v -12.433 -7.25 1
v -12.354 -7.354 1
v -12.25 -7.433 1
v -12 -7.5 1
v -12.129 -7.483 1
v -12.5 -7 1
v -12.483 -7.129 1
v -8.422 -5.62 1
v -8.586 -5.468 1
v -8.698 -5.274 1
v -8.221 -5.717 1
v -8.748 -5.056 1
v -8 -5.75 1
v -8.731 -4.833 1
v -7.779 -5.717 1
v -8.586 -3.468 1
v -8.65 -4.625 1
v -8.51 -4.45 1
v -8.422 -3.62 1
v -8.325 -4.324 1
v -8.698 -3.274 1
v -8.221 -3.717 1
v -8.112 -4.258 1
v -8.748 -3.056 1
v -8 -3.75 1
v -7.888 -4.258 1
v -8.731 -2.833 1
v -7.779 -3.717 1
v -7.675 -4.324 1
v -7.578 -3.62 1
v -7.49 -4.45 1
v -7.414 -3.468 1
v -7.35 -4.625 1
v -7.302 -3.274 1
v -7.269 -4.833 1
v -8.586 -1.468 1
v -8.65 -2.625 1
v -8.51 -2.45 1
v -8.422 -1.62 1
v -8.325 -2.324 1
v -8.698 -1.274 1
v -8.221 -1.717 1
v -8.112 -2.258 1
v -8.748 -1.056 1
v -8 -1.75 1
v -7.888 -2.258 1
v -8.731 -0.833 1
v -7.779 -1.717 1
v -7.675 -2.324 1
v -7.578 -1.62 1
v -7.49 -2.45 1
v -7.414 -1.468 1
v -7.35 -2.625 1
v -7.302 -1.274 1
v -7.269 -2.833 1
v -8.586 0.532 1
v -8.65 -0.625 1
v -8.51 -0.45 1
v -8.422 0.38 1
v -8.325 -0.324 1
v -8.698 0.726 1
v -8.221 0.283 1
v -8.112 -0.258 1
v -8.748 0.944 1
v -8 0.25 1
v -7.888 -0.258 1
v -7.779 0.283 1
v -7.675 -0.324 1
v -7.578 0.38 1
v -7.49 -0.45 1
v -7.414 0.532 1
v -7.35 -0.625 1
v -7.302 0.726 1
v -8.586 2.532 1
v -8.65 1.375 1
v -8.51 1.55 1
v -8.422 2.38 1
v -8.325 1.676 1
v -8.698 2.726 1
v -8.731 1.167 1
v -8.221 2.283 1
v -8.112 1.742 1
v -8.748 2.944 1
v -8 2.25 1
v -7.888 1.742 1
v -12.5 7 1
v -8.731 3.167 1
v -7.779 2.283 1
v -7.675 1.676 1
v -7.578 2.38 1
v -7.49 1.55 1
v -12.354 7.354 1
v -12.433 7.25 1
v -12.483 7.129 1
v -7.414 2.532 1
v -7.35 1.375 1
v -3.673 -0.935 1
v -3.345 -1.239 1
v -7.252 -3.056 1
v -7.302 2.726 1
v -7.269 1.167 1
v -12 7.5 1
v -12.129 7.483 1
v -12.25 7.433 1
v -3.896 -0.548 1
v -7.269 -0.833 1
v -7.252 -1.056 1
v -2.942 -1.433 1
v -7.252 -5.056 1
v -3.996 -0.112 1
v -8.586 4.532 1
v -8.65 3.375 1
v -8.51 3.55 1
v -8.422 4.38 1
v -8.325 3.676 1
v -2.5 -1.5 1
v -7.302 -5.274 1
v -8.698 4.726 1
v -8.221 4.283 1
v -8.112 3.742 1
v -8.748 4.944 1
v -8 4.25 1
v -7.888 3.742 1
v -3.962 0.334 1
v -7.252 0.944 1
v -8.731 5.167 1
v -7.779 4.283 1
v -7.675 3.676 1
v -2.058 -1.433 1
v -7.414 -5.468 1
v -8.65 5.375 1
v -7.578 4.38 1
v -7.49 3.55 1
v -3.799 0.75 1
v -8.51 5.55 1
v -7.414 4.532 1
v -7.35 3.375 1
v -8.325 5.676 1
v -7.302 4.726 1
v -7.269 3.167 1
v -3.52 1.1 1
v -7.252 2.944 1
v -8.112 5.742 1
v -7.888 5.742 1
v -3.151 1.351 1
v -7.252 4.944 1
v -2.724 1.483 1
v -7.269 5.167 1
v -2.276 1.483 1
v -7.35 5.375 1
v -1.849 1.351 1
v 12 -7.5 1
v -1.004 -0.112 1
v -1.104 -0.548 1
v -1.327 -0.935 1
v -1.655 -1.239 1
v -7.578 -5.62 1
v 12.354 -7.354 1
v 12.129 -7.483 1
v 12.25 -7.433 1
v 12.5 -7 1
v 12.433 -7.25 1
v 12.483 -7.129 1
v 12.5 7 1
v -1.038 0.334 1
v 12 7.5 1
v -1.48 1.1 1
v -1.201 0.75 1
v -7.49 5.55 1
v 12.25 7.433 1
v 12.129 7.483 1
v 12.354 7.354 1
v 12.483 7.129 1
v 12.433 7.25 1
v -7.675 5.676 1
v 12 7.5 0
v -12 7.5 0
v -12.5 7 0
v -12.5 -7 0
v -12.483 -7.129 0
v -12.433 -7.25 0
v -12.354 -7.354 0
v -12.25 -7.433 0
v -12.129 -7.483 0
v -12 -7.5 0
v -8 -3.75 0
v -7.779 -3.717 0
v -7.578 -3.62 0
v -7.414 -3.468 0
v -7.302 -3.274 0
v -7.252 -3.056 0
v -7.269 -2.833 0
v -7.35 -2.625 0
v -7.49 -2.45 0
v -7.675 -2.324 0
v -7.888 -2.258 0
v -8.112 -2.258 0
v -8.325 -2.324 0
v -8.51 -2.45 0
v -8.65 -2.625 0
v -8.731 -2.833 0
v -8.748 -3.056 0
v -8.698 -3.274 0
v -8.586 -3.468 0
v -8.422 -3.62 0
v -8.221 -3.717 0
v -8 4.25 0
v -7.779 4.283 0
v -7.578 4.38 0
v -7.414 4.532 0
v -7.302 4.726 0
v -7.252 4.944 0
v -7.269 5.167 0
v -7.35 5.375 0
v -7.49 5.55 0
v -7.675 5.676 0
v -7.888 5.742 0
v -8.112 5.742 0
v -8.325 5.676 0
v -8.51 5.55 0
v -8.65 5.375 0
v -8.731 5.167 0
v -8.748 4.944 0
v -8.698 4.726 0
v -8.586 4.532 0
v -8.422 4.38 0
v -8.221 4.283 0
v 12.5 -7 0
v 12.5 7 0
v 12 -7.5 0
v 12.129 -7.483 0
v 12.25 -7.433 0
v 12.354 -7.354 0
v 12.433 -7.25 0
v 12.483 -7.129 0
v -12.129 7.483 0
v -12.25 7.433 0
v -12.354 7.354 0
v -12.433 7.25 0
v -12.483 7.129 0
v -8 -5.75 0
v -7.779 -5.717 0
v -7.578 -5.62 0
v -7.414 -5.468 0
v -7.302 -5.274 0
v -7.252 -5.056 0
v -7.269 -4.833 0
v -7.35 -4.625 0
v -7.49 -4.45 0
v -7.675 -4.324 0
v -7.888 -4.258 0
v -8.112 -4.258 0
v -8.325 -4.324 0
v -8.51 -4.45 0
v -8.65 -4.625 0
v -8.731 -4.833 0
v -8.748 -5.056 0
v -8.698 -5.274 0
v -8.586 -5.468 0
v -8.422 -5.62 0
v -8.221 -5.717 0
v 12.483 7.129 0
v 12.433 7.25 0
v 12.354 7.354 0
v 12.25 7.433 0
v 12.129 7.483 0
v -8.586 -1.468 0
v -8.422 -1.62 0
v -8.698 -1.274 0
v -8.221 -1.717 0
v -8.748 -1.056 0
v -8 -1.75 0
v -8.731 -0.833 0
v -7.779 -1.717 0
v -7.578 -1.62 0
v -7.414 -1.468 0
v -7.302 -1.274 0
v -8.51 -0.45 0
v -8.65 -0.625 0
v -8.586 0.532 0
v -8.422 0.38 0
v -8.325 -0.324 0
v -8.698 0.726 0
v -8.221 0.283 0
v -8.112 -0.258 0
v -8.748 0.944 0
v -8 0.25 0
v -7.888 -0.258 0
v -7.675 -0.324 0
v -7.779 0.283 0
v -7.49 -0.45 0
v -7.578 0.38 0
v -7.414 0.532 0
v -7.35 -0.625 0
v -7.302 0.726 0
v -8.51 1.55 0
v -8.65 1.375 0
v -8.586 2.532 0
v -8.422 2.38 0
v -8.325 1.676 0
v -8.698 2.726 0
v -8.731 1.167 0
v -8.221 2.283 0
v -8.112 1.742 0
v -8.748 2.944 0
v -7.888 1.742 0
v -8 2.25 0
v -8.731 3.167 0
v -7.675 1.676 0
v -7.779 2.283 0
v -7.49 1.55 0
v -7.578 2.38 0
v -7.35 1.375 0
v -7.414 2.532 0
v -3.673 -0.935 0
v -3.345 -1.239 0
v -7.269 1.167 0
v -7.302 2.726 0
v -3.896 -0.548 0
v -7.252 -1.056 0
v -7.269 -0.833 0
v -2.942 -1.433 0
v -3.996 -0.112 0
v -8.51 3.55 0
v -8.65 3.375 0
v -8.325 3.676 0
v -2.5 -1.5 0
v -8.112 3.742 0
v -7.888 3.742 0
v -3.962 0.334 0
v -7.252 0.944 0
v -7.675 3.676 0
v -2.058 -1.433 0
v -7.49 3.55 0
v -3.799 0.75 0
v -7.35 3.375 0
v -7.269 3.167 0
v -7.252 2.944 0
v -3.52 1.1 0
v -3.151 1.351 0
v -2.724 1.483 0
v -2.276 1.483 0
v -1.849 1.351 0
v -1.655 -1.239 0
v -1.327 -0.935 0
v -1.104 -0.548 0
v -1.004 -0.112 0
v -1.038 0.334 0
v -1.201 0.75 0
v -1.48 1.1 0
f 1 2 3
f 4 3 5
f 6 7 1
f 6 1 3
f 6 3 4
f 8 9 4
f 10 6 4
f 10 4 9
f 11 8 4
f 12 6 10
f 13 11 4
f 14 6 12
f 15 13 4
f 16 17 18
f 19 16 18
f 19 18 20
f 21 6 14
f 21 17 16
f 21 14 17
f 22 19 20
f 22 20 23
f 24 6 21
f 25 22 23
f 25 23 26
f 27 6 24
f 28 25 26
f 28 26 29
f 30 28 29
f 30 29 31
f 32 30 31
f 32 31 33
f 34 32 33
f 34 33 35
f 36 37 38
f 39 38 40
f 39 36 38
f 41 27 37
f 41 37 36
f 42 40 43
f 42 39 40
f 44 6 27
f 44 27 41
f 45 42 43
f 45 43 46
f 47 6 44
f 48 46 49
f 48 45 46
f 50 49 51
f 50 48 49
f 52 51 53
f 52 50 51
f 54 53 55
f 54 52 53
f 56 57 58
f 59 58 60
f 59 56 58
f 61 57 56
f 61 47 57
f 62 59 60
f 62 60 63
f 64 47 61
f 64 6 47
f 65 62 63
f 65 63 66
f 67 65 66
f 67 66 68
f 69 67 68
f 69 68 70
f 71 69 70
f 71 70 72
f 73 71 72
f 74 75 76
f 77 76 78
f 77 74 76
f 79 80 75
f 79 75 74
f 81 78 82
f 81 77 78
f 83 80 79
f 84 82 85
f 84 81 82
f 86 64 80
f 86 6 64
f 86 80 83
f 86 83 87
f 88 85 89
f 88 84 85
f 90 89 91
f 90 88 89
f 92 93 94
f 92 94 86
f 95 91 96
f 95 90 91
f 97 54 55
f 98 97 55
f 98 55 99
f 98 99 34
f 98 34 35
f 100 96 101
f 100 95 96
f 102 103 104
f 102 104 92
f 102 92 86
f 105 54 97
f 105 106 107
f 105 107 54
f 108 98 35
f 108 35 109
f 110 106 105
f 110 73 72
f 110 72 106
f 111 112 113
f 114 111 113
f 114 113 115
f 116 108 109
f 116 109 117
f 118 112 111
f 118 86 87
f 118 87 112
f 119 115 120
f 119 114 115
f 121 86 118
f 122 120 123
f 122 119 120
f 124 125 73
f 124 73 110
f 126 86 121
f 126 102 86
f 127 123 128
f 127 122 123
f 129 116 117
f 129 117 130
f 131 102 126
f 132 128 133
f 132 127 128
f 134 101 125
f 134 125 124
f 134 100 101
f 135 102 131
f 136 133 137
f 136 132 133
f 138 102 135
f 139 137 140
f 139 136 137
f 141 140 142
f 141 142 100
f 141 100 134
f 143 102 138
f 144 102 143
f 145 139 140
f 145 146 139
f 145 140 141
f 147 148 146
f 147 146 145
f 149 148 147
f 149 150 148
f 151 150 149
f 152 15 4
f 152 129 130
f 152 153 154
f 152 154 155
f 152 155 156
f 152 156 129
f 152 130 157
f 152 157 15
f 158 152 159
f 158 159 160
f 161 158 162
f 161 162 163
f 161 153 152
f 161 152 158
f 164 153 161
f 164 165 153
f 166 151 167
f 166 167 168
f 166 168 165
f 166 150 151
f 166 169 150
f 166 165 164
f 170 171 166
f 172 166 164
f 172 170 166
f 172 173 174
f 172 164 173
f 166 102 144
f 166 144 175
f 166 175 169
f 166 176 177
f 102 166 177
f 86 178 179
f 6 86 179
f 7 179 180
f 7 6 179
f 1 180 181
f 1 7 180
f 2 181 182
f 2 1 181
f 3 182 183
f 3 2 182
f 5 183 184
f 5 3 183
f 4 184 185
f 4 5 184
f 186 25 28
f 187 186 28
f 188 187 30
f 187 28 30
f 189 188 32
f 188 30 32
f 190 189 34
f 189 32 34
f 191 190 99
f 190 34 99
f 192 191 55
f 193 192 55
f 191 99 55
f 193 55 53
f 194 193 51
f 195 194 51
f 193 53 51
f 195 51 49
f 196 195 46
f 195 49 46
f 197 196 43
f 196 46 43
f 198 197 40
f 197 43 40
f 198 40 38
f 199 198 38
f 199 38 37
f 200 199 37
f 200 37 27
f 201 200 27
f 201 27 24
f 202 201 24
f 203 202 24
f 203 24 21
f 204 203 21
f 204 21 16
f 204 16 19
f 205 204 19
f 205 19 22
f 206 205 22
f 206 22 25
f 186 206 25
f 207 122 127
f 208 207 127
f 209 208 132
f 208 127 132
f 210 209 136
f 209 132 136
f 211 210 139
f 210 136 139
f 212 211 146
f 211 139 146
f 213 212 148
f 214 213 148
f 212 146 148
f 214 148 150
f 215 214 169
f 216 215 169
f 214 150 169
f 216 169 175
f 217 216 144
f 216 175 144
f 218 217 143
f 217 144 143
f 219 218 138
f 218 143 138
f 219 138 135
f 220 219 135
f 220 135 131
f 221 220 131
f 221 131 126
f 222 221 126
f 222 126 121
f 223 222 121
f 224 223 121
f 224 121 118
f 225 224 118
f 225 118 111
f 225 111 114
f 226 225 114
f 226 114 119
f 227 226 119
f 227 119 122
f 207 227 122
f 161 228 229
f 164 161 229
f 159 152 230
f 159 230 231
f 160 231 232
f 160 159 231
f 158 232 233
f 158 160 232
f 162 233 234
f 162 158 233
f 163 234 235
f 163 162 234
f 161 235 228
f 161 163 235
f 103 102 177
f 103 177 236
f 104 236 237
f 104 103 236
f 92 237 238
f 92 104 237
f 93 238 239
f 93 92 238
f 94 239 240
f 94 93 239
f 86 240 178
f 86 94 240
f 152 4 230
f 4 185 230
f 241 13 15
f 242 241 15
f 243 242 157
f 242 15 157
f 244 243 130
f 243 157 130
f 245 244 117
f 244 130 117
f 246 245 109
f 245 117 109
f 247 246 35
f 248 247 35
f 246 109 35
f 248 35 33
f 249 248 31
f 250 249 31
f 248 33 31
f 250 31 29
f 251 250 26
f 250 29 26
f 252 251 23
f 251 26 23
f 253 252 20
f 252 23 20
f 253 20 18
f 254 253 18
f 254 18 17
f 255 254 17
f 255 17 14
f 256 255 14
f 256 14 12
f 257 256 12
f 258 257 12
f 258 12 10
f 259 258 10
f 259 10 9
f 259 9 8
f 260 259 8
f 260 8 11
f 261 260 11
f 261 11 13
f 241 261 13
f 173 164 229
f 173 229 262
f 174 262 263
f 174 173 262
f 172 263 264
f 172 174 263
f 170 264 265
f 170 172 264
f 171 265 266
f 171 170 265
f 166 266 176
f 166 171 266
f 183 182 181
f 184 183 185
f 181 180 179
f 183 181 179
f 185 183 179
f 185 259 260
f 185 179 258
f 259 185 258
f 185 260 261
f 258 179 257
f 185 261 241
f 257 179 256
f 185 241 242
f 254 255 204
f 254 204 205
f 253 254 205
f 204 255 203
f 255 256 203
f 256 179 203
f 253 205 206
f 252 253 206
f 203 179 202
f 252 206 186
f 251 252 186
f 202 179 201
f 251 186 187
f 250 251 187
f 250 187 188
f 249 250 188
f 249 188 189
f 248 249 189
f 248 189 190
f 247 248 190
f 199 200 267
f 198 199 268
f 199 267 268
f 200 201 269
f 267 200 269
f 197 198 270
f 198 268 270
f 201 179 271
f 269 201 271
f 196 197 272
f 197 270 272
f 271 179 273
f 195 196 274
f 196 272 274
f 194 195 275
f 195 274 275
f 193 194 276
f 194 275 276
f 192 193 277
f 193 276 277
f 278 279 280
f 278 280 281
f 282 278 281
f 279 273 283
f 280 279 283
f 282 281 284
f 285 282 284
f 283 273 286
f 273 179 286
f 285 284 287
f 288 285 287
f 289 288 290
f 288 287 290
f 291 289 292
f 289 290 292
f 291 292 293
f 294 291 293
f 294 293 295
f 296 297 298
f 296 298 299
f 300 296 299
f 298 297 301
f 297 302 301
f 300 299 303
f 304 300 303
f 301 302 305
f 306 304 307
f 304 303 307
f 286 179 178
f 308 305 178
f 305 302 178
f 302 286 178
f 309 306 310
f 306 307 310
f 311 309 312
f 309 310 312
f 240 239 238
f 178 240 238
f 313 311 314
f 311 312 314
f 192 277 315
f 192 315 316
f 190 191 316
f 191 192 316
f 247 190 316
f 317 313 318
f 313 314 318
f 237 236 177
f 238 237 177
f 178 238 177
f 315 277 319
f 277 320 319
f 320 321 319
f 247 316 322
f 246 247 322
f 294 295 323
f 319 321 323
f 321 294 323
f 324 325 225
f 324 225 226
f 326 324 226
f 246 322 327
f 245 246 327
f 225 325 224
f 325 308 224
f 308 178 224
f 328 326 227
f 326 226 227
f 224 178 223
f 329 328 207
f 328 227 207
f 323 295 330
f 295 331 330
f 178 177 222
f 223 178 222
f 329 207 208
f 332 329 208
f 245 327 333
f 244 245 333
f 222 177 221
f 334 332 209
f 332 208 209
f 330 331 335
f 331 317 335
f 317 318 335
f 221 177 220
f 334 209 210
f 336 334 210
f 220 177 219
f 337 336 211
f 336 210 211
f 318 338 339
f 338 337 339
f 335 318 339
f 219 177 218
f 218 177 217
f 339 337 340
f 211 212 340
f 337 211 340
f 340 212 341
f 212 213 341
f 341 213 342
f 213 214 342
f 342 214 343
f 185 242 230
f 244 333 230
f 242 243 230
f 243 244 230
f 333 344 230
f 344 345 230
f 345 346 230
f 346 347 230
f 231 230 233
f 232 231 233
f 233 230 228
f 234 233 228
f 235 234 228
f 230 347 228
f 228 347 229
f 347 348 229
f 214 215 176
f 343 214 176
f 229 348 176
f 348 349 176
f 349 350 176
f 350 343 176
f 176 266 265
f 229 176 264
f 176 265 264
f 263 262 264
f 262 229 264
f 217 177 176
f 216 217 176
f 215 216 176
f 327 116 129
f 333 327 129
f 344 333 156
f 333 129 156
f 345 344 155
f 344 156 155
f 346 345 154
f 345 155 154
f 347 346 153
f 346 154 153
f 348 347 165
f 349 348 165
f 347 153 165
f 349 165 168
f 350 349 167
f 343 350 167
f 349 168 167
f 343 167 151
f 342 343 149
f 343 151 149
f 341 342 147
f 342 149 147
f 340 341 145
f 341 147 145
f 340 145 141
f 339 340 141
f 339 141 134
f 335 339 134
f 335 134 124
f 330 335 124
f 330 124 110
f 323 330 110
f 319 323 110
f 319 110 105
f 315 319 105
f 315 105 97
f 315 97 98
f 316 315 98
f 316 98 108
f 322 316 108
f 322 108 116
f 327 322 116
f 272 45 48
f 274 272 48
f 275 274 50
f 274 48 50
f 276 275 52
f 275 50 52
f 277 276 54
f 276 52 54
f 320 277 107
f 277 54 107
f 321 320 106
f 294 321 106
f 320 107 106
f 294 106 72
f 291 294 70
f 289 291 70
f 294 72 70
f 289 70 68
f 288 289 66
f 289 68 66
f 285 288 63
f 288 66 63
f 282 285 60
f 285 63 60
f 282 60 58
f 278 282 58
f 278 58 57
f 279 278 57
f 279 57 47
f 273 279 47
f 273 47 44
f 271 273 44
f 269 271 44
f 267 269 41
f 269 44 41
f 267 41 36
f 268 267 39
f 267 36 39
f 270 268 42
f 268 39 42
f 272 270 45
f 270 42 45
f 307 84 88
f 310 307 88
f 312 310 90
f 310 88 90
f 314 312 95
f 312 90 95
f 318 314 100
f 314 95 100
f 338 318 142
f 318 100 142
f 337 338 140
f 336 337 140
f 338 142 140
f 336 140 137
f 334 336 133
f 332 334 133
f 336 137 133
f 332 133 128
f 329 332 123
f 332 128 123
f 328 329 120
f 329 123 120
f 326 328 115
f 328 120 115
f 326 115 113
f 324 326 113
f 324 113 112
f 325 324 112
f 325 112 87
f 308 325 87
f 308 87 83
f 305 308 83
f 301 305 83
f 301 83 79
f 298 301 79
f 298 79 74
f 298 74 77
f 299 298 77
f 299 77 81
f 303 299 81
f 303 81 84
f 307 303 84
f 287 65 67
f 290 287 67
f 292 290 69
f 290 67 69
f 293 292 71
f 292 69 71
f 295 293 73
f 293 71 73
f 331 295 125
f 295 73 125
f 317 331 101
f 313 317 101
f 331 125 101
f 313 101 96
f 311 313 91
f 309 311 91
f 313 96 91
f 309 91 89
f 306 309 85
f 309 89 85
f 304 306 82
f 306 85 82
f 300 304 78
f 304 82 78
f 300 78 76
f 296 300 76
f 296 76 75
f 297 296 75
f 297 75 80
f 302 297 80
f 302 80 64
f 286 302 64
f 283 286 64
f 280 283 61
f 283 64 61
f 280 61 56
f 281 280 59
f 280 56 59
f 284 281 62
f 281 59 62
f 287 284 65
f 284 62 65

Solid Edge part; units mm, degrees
sketch "Sketch1" plane through (0, 0, 0) normal (0, 0, 1) x (1, 0, 0)
  line L0 (12.5, 7.5) -> (-12.5, 7.5)
  line L1 (-12.5, 7.5) -> (-12.5, -7.5)
  line L2 (-12.5, -7.5) -> (12.5, -7.5)
  line L3 (12.5, -7.5) -> (12.5, 7.5)
extrude "Protrusion1" add sketch "Sketch1" along normal blind 1
fillet "Round_1" radius 0.5 4 edges at (12.5, 7.5, 0.5) (12.5, -7.5, 0.5) (-12.5, -7.5, 0.5) (-12.5, 7.5, 0.5)
hole "Hole_1" at (-2.5, 0, 1) direction (0, 0, -1) diameter 3 end up to next
hole "Hole_2" at (-8, 5, 1) direction (0, 0, -1) diameter 1.5 end up to next
hole "Hole1" at (-8, 3, 1) direction (0, 0, -1) diameter 1.5 end up to next
hole "Hole2" at (-8, 1, 1) direction (0, 0, -1) diameter 1.5 end up to next
hole "Hole3" at (-8, -1, 1) direction (0, 0, -1) diameter 1.5 end up to next
hole "Hole4" at (-8, -3, 1) direction (0, 0, -1) diameter 1.5 end up to next
hole "Hole5" at (-8, -5, 1) direction (0, 0, -1) diameter 1.5 end up to next
